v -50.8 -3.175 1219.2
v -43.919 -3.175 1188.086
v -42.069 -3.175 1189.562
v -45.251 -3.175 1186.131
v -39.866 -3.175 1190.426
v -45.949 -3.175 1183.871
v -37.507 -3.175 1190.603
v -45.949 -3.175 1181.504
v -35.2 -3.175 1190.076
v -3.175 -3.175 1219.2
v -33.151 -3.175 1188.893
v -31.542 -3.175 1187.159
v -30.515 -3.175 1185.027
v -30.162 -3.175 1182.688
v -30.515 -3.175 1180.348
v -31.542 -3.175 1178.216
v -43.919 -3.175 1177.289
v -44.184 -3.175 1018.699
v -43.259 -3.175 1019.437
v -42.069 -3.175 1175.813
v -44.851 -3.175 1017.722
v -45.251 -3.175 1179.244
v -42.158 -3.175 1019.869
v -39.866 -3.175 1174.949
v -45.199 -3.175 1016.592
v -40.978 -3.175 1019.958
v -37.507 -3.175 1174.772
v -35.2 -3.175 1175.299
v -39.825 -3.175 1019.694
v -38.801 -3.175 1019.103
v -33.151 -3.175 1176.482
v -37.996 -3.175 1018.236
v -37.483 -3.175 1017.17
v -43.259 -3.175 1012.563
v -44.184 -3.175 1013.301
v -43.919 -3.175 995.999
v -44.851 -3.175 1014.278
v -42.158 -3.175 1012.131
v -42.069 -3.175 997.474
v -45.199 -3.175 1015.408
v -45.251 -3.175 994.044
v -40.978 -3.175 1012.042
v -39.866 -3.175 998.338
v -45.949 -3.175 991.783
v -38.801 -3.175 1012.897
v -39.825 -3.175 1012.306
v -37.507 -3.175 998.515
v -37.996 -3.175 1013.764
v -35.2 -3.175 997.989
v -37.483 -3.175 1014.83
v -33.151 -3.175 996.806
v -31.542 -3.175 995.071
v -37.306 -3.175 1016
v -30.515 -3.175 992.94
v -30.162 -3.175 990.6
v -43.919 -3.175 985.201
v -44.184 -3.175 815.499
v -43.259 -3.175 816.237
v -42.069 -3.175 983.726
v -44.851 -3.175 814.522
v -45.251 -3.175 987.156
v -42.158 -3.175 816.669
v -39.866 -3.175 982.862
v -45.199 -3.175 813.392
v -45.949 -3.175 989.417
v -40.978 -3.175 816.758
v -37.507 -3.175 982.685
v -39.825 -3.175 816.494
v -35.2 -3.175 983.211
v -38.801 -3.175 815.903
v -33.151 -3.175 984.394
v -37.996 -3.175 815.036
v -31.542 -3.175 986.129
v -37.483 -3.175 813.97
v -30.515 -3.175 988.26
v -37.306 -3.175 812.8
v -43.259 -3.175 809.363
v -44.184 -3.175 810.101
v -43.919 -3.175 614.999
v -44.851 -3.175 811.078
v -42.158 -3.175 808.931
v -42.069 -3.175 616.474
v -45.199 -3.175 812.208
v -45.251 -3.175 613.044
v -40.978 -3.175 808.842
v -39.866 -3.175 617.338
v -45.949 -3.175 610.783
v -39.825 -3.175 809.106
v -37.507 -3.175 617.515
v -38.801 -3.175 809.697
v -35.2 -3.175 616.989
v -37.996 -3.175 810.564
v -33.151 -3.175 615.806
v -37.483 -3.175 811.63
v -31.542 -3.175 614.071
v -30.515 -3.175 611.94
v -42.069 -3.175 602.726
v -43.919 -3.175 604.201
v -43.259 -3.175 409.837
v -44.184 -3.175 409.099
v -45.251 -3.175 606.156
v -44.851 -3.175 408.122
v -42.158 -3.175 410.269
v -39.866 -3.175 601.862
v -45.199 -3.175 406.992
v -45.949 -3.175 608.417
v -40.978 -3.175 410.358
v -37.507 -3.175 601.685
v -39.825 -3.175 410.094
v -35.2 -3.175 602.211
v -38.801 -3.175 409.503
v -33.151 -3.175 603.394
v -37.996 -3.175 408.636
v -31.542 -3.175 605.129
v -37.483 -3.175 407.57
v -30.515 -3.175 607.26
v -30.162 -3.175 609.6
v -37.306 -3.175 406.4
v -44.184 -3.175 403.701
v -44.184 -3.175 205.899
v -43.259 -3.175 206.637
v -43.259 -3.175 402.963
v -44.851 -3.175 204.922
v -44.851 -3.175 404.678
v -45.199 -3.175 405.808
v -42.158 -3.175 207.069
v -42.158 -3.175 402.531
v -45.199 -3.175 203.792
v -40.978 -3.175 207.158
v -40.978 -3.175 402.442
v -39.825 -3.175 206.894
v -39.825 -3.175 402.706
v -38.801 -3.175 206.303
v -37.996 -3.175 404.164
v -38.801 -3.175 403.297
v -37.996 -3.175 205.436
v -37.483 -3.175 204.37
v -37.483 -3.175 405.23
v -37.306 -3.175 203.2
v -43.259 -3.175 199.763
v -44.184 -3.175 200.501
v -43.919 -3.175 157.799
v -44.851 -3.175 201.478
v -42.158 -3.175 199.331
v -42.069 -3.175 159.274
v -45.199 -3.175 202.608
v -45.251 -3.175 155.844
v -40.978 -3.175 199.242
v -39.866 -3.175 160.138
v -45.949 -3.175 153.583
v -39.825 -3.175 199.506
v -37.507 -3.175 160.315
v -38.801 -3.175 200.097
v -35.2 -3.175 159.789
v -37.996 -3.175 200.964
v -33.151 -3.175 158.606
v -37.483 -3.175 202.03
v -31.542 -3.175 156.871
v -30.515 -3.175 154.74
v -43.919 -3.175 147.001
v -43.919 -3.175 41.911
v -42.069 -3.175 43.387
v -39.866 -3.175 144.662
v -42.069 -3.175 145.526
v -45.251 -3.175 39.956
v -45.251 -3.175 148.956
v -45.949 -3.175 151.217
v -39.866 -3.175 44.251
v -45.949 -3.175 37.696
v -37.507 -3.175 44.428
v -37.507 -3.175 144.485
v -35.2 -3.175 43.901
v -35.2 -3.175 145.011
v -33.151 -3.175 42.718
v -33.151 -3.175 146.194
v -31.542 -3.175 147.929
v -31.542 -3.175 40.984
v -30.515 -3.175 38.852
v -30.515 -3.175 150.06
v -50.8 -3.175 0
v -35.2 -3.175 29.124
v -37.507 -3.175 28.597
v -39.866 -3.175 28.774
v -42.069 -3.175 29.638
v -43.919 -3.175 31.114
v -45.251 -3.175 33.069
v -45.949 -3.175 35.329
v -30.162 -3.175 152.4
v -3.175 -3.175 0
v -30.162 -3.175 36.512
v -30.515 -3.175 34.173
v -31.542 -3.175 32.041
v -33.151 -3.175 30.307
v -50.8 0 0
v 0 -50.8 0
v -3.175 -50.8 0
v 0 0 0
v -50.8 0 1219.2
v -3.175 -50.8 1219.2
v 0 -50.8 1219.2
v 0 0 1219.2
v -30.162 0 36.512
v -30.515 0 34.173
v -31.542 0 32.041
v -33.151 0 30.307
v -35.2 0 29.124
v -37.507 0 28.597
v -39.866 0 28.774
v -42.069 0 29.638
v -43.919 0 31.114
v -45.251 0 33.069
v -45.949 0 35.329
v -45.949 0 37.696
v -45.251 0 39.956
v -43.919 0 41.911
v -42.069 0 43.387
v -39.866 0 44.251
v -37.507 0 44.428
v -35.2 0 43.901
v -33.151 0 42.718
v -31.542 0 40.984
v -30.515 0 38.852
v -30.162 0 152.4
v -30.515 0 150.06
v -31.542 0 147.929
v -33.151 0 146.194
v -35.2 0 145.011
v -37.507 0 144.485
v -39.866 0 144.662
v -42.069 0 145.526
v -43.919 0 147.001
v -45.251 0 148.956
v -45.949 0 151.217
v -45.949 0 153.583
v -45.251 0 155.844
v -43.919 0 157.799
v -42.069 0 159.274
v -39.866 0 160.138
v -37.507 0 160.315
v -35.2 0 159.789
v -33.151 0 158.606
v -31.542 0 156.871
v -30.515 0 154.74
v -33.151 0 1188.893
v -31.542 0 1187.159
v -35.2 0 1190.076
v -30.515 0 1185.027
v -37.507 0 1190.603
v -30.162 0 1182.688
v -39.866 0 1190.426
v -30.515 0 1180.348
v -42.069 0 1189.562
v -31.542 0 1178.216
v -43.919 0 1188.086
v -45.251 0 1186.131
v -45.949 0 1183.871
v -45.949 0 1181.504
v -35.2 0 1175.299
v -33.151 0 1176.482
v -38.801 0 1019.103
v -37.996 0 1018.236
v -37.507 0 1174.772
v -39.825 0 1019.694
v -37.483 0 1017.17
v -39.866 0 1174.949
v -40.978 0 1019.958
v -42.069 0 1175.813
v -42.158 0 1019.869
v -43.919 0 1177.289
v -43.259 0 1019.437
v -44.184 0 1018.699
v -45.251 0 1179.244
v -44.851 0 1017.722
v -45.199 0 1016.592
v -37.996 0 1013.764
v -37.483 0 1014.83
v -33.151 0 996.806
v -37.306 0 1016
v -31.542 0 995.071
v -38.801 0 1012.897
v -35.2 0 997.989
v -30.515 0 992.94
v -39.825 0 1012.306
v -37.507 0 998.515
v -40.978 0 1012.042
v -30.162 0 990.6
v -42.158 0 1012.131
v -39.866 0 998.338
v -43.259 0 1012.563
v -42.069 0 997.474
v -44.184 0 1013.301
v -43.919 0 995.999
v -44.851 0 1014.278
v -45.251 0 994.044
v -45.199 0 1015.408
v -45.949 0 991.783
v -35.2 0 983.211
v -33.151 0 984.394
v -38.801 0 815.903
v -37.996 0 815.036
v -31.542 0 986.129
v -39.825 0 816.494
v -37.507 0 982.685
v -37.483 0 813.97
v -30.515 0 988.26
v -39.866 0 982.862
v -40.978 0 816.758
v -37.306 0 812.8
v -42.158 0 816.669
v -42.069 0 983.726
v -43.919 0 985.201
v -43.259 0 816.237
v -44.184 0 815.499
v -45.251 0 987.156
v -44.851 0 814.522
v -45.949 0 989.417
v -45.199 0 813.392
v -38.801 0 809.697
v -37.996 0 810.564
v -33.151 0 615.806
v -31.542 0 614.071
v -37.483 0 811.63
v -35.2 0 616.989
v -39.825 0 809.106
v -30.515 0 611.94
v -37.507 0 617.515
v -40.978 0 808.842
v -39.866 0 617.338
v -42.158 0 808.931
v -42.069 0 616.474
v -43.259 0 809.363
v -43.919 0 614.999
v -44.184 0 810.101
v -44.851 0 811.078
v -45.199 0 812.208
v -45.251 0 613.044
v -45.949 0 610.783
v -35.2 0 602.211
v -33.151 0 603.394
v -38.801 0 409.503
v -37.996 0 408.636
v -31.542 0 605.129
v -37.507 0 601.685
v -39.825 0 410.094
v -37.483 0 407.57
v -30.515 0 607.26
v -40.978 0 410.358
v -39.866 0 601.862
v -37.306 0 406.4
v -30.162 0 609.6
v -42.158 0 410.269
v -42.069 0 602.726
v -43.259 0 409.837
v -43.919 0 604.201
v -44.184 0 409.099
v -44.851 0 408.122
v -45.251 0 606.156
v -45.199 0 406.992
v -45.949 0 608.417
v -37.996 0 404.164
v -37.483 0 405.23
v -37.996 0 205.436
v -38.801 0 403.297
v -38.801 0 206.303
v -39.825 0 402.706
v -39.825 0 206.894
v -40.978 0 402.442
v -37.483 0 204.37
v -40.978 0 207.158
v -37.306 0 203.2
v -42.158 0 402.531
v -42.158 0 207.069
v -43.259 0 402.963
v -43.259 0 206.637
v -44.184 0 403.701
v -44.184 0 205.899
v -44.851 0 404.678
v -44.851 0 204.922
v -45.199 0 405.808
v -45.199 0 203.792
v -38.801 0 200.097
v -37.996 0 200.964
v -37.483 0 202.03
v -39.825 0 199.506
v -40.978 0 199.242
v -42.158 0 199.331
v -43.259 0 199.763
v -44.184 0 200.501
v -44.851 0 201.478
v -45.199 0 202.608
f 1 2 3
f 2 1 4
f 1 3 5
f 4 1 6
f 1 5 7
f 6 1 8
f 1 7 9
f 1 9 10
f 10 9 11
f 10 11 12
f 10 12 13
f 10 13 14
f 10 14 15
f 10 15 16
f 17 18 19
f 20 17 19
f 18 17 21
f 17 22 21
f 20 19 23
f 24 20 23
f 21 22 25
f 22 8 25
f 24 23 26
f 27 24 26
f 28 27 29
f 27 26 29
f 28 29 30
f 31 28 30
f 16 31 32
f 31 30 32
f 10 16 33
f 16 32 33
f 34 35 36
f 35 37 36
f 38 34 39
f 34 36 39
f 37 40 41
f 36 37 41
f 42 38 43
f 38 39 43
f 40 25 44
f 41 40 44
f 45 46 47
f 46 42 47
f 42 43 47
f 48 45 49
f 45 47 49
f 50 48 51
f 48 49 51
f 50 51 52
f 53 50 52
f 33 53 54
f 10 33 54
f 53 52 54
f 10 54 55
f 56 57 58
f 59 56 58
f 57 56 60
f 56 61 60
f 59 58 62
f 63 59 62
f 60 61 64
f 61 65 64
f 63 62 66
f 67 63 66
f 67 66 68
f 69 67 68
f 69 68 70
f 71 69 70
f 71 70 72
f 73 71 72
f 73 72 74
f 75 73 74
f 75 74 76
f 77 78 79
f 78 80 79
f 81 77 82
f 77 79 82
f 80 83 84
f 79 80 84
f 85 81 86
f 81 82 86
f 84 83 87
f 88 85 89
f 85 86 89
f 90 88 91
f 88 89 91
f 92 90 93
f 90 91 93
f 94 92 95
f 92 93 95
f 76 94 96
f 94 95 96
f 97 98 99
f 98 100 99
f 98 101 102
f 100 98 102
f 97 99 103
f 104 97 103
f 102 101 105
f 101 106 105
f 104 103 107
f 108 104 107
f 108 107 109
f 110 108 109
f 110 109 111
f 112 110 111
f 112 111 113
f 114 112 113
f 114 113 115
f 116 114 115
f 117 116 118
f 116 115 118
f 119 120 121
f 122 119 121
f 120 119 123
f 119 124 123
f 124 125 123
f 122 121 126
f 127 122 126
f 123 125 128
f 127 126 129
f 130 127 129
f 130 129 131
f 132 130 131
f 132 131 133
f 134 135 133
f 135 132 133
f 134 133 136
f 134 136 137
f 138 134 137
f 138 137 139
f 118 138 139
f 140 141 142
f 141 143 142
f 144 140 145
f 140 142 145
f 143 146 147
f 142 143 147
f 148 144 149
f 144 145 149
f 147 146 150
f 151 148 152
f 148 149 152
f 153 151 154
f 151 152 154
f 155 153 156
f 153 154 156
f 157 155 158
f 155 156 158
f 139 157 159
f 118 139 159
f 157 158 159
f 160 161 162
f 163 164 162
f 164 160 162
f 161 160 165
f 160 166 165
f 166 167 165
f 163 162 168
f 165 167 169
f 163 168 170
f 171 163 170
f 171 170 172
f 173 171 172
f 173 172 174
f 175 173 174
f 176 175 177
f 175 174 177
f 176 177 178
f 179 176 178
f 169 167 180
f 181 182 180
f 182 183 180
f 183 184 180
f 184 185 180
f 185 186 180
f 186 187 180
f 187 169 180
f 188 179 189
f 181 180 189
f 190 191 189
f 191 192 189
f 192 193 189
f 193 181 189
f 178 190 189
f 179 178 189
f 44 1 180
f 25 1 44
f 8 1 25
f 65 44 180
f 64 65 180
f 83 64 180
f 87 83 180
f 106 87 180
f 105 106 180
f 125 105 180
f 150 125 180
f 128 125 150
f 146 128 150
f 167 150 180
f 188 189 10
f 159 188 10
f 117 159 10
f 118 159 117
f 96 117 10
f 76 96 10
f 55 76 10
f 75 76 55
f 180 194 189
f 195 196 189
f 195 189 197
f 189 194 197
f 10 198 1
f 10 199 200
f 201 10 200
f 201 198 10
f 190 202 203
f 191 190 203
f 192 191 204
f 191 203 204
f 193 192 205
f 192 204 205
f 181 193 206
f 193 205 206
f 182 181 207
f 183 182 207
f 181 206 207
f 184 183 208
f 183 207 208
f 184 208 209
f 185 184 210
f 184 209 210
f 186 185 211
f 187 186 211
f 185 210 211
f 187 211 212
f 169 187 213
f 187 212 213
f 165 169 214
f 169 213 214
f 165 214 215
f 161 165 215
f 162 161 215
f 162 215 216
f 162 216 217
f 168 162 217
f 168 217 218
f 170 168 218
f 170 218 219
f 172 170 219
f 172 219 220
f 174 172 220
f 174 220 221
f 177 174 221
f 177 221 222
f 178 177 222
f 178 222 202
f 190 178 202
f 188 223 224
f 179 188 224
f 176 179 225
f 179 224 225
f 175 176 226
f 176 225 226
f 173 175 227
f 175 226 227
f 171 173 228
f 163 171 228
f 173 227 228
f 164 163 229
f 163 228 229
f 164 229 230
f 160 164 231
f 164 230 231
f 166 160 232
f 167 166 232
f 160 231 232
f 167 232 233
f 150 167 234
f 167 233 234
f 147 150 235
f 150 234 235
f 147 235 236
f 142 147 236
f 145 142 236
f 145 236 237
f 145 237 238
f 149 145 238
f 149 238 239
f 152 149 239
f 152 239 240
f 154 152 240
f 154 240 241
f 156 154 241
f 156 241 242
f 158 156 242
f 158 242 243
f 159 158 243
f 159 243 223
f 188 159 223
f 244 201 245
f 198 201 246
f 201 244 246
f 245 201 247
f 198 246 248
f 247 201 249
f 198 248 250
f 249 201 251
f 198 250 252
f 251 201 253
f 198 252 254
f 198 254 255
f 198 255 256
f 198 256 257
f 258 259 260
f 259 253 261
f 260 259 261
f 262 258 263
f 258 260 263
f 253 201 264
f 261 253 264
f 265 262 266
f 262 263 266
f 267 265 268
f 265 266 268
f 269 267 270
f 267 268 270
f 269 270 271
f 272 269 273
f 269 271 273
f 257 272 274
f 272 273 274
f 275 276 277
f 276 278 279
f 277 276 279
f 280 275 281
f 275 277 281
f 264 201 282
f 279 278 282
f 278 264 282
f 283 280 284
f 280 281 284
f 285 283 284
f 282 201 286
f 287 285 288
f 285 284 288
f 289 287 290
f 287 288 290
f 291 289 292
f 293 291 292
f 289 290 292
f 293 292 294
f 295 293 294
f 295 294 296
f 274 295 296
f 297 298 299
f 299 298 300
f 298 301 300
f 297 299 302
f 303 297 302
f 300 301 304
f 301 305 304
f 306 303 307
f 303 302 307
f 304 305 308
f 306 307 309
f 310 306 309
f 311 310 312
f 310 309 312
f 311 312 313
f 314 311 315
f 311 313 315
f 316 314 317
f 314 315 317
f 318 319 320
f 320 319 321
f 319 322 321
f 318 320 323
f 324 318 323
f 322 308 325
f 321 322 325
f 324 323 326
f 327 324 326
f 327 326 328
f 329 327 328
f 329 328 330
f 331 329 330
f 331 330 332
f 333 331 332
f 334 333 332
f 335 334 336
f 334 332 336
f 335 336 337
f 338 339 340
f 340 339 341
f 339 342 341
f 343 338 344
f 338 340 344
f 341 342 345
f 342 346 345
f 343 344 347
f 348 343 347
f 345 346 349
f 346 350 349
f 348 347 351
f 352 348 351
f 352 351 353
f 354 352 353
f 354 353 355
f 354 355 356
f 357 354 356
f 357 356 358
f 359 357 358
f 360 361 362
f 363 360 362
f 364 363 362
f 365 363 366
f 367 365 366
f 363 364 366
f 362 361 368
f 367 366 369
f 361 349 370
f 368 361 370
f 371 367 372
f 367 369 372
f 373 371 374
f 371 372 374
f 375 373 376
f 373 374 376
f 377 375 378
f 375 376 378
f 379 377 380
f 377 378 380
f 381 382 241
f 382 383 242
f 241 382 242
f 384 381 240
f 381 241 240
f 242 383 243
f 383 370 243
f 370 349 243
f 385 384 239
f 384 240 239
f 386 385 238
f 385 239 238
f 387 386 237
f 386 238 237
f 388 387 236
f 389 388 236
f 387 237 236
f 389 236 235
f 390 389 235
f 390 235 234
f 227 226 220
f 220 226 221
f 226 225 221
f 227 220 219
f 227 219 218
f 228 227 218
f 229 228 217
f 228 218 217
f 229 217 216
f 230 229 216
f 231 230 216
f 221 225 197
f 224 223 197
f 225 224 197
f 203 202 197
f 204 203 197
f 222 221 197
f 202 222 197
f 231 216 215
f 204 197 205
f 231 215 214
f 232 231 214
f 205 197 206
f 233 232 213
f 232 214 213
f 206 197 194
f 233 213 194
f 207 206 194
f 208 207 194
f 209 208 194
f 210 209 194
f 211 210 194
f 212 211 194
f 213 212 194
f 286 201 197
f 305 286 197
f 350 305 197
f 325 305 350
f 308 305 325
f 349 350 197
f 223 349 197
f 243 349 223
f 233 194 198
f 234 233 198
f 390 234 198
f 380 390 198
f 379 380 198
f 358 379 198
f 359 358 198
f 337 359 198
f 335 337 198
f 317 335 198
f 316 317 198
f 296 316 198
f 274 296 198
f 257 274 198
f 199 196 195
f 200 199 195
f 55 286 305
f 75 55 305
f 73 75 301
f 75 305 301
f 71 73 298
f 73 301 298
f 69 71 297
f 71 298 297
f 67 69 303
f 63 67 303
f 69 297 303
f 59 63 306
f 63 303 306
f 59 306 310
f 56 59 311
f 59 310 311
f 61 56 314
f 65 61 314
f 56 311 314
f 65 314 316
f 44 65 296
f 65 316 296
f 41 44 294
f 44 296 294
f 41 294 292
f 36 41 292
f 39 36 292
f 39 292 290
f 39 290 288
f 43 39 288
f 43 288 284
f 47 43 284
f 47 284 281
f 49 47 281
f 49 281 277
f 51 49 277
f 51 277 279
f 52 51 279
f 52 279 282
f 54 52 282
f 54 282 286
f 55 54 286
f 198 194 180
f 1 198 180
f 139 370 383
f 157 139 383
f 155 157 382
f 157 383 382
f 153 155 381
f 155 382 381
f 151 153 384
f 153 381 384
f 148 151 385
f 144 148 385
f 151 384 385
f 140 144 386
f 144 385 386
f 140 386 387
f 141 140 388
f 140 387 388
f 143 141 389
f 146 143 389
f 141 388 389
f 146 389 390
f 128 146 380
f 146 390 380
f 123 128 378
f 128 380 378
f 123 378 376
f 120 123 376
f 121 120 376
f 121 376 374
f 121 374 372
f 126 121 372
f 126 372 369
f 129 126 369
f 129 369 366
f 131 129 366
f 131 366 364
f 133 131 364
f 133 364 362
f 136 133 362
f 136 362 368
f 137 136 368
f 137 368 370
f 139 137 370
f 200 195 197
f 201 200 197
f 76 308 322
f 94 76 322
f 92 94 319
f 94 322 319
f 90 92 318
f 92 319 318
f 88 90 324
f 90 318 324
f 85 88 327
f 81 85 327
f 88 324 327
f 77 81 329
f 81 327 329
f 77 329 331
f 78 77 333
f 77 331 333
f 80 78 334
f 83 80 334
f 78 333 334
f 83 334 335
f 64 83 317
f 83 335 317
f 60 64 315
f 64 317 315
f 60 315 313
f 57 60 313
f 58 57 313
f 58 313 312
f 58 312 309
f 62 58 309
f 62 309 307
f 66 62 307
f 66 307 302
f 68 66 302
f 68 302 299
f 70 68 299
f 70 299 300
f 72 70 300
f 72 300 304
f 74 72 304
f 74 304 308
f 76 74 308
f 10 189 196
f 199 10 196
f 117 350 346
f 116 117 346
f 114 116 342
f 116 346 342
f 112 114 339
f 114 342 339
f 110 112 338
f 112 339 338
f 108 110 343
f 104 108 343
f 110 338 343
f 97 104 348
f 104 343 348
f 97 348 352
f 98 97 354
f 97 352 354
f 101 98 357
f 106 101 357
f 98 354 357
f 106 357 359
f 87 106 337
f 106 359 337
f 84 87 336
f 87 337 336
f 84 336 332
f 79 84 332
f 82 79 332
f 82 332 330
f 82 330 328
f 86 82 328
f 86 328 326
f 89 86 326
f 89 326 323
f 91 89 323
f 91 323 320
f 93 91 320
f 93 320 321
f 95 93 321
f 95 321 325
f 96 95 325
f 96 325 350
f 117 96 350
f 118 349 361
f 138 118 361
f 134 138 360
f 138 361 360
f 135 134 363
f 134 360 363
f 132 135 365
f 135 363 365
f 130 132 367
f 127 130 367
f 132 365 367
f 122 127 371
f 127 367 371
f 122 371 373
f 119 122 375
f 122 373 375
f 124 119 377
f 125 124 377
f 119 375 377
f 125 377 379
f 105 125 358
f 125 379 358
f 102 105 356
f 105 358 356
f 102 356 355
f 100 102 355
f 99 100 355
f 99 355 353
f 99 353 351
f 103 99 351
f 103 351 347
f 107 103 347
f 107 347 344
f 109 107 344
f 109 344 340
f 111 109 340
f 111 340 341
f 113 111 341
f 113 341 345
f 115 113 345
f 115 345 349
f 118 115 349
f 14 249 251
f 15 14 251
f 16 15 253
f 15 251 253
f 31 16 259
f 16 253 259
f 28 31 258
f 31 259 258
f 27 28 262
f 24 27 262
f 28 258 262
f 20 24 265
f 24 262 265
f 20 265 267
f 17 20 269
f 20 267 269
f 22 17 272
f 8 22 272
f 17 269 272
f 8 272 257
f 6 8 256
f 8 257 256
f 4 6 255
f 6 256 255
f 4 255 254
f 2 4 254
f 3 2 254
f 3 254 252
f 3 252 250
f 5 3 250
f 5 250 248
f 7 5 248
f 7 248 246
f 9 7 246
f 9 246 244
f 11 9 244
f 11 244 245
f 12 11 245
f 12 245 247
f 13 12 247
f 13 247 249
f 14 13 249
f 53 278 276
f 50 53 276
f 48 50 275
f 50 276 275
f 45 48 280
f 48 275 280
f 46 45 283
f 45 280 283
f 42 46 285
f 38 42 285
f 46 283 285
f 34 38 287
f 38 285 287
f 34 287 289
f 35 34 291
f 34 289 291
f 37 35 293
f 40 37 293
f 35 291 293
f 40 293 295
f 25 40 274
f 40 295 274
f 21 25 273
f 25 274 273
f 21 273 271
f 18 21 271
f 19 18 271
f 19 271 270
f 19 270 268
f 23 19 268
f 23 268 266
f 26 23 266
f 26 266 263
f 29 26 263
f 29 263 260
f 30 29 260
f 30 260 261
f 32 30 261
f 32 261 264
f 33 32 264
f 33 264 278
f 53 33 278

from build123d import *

# Parameters (mm, degrees)
BOSS_EXTRUDE1_DEPTH = 1219.2
SKETCH2_R           = 7.9375
CUT_EXTRUDE1_DEPTH  = 51.8
SKETCH4_R           = 3.96875
CUT_EXTRUDE3_DEPTH  = 44.45
LPATTERN1_COUNT     = 5
LPATTERN1_PITCH     = 203.2


with BuildPart() as part:
    # Sketch1 → Boss-Extrude1 (new body)
    with BuildSketch(Plane.XY):
        Polygon((0, 0), (-50.8, 0), (-50.8, -3.175), (-3.175, -3.175), (-3.175, -50.8), (0, -50.8), align=None)
    extrude(amount=BOSS_EXTRUDE1_DEPTH)

    # Sketch2 → Cut-Extrude1 (cut, through all)
    with BuildSketch(Plane(origin=(0, 0, 0), x_dir=(1, 0, 0), z_dir=(0, 1, 0))):
        with Locations((-38.1, -36.5125)):
            Circle(SKETCH2_R)
        with Locations((-38.1, -1182.6875)):
            Circle(SKETCH2_R)
        with Locations((-38.1, -152.4)):
            Circle(SKETCH2_R)
        with Locations((-38.1, -609.6)):
            Circle(SKETCH2_R)
        with Locations((-38.1, -990.6)):
            Circle(SKETCH2_R)
    extrude(amount=-CUT_EXTRUDE1_DEPTH, mode=Mode.SUBTRACT)

    # Sketch4 → Cut-Extrude3 (cut)
    with BuildSketch(Plane(origin=(-2.029899632, 0, 893.163272881), x_dir=(1, 0, 0), z_dir=(0, 1, 0))):
        with Locations((-39.245100368, 689.963272881)):
            Circle(SKETCH4_R)
    cut_extrude3 = extrude(amount=-CUT_EXTRUDE3_DEPTH, mode=Mode.SUBTRACT)

    # LPattern1: Cut-Extrude3 ×5, 1 skipped
    with Locations(*[(0, 0, i * LPATTERN1_PITCH) for i in range(1, LPATTERN1_COUNT) if i not in (2,)]):
        add(cut_extrude3, mode=Mode.SUBTRACT)


solid = part.part
